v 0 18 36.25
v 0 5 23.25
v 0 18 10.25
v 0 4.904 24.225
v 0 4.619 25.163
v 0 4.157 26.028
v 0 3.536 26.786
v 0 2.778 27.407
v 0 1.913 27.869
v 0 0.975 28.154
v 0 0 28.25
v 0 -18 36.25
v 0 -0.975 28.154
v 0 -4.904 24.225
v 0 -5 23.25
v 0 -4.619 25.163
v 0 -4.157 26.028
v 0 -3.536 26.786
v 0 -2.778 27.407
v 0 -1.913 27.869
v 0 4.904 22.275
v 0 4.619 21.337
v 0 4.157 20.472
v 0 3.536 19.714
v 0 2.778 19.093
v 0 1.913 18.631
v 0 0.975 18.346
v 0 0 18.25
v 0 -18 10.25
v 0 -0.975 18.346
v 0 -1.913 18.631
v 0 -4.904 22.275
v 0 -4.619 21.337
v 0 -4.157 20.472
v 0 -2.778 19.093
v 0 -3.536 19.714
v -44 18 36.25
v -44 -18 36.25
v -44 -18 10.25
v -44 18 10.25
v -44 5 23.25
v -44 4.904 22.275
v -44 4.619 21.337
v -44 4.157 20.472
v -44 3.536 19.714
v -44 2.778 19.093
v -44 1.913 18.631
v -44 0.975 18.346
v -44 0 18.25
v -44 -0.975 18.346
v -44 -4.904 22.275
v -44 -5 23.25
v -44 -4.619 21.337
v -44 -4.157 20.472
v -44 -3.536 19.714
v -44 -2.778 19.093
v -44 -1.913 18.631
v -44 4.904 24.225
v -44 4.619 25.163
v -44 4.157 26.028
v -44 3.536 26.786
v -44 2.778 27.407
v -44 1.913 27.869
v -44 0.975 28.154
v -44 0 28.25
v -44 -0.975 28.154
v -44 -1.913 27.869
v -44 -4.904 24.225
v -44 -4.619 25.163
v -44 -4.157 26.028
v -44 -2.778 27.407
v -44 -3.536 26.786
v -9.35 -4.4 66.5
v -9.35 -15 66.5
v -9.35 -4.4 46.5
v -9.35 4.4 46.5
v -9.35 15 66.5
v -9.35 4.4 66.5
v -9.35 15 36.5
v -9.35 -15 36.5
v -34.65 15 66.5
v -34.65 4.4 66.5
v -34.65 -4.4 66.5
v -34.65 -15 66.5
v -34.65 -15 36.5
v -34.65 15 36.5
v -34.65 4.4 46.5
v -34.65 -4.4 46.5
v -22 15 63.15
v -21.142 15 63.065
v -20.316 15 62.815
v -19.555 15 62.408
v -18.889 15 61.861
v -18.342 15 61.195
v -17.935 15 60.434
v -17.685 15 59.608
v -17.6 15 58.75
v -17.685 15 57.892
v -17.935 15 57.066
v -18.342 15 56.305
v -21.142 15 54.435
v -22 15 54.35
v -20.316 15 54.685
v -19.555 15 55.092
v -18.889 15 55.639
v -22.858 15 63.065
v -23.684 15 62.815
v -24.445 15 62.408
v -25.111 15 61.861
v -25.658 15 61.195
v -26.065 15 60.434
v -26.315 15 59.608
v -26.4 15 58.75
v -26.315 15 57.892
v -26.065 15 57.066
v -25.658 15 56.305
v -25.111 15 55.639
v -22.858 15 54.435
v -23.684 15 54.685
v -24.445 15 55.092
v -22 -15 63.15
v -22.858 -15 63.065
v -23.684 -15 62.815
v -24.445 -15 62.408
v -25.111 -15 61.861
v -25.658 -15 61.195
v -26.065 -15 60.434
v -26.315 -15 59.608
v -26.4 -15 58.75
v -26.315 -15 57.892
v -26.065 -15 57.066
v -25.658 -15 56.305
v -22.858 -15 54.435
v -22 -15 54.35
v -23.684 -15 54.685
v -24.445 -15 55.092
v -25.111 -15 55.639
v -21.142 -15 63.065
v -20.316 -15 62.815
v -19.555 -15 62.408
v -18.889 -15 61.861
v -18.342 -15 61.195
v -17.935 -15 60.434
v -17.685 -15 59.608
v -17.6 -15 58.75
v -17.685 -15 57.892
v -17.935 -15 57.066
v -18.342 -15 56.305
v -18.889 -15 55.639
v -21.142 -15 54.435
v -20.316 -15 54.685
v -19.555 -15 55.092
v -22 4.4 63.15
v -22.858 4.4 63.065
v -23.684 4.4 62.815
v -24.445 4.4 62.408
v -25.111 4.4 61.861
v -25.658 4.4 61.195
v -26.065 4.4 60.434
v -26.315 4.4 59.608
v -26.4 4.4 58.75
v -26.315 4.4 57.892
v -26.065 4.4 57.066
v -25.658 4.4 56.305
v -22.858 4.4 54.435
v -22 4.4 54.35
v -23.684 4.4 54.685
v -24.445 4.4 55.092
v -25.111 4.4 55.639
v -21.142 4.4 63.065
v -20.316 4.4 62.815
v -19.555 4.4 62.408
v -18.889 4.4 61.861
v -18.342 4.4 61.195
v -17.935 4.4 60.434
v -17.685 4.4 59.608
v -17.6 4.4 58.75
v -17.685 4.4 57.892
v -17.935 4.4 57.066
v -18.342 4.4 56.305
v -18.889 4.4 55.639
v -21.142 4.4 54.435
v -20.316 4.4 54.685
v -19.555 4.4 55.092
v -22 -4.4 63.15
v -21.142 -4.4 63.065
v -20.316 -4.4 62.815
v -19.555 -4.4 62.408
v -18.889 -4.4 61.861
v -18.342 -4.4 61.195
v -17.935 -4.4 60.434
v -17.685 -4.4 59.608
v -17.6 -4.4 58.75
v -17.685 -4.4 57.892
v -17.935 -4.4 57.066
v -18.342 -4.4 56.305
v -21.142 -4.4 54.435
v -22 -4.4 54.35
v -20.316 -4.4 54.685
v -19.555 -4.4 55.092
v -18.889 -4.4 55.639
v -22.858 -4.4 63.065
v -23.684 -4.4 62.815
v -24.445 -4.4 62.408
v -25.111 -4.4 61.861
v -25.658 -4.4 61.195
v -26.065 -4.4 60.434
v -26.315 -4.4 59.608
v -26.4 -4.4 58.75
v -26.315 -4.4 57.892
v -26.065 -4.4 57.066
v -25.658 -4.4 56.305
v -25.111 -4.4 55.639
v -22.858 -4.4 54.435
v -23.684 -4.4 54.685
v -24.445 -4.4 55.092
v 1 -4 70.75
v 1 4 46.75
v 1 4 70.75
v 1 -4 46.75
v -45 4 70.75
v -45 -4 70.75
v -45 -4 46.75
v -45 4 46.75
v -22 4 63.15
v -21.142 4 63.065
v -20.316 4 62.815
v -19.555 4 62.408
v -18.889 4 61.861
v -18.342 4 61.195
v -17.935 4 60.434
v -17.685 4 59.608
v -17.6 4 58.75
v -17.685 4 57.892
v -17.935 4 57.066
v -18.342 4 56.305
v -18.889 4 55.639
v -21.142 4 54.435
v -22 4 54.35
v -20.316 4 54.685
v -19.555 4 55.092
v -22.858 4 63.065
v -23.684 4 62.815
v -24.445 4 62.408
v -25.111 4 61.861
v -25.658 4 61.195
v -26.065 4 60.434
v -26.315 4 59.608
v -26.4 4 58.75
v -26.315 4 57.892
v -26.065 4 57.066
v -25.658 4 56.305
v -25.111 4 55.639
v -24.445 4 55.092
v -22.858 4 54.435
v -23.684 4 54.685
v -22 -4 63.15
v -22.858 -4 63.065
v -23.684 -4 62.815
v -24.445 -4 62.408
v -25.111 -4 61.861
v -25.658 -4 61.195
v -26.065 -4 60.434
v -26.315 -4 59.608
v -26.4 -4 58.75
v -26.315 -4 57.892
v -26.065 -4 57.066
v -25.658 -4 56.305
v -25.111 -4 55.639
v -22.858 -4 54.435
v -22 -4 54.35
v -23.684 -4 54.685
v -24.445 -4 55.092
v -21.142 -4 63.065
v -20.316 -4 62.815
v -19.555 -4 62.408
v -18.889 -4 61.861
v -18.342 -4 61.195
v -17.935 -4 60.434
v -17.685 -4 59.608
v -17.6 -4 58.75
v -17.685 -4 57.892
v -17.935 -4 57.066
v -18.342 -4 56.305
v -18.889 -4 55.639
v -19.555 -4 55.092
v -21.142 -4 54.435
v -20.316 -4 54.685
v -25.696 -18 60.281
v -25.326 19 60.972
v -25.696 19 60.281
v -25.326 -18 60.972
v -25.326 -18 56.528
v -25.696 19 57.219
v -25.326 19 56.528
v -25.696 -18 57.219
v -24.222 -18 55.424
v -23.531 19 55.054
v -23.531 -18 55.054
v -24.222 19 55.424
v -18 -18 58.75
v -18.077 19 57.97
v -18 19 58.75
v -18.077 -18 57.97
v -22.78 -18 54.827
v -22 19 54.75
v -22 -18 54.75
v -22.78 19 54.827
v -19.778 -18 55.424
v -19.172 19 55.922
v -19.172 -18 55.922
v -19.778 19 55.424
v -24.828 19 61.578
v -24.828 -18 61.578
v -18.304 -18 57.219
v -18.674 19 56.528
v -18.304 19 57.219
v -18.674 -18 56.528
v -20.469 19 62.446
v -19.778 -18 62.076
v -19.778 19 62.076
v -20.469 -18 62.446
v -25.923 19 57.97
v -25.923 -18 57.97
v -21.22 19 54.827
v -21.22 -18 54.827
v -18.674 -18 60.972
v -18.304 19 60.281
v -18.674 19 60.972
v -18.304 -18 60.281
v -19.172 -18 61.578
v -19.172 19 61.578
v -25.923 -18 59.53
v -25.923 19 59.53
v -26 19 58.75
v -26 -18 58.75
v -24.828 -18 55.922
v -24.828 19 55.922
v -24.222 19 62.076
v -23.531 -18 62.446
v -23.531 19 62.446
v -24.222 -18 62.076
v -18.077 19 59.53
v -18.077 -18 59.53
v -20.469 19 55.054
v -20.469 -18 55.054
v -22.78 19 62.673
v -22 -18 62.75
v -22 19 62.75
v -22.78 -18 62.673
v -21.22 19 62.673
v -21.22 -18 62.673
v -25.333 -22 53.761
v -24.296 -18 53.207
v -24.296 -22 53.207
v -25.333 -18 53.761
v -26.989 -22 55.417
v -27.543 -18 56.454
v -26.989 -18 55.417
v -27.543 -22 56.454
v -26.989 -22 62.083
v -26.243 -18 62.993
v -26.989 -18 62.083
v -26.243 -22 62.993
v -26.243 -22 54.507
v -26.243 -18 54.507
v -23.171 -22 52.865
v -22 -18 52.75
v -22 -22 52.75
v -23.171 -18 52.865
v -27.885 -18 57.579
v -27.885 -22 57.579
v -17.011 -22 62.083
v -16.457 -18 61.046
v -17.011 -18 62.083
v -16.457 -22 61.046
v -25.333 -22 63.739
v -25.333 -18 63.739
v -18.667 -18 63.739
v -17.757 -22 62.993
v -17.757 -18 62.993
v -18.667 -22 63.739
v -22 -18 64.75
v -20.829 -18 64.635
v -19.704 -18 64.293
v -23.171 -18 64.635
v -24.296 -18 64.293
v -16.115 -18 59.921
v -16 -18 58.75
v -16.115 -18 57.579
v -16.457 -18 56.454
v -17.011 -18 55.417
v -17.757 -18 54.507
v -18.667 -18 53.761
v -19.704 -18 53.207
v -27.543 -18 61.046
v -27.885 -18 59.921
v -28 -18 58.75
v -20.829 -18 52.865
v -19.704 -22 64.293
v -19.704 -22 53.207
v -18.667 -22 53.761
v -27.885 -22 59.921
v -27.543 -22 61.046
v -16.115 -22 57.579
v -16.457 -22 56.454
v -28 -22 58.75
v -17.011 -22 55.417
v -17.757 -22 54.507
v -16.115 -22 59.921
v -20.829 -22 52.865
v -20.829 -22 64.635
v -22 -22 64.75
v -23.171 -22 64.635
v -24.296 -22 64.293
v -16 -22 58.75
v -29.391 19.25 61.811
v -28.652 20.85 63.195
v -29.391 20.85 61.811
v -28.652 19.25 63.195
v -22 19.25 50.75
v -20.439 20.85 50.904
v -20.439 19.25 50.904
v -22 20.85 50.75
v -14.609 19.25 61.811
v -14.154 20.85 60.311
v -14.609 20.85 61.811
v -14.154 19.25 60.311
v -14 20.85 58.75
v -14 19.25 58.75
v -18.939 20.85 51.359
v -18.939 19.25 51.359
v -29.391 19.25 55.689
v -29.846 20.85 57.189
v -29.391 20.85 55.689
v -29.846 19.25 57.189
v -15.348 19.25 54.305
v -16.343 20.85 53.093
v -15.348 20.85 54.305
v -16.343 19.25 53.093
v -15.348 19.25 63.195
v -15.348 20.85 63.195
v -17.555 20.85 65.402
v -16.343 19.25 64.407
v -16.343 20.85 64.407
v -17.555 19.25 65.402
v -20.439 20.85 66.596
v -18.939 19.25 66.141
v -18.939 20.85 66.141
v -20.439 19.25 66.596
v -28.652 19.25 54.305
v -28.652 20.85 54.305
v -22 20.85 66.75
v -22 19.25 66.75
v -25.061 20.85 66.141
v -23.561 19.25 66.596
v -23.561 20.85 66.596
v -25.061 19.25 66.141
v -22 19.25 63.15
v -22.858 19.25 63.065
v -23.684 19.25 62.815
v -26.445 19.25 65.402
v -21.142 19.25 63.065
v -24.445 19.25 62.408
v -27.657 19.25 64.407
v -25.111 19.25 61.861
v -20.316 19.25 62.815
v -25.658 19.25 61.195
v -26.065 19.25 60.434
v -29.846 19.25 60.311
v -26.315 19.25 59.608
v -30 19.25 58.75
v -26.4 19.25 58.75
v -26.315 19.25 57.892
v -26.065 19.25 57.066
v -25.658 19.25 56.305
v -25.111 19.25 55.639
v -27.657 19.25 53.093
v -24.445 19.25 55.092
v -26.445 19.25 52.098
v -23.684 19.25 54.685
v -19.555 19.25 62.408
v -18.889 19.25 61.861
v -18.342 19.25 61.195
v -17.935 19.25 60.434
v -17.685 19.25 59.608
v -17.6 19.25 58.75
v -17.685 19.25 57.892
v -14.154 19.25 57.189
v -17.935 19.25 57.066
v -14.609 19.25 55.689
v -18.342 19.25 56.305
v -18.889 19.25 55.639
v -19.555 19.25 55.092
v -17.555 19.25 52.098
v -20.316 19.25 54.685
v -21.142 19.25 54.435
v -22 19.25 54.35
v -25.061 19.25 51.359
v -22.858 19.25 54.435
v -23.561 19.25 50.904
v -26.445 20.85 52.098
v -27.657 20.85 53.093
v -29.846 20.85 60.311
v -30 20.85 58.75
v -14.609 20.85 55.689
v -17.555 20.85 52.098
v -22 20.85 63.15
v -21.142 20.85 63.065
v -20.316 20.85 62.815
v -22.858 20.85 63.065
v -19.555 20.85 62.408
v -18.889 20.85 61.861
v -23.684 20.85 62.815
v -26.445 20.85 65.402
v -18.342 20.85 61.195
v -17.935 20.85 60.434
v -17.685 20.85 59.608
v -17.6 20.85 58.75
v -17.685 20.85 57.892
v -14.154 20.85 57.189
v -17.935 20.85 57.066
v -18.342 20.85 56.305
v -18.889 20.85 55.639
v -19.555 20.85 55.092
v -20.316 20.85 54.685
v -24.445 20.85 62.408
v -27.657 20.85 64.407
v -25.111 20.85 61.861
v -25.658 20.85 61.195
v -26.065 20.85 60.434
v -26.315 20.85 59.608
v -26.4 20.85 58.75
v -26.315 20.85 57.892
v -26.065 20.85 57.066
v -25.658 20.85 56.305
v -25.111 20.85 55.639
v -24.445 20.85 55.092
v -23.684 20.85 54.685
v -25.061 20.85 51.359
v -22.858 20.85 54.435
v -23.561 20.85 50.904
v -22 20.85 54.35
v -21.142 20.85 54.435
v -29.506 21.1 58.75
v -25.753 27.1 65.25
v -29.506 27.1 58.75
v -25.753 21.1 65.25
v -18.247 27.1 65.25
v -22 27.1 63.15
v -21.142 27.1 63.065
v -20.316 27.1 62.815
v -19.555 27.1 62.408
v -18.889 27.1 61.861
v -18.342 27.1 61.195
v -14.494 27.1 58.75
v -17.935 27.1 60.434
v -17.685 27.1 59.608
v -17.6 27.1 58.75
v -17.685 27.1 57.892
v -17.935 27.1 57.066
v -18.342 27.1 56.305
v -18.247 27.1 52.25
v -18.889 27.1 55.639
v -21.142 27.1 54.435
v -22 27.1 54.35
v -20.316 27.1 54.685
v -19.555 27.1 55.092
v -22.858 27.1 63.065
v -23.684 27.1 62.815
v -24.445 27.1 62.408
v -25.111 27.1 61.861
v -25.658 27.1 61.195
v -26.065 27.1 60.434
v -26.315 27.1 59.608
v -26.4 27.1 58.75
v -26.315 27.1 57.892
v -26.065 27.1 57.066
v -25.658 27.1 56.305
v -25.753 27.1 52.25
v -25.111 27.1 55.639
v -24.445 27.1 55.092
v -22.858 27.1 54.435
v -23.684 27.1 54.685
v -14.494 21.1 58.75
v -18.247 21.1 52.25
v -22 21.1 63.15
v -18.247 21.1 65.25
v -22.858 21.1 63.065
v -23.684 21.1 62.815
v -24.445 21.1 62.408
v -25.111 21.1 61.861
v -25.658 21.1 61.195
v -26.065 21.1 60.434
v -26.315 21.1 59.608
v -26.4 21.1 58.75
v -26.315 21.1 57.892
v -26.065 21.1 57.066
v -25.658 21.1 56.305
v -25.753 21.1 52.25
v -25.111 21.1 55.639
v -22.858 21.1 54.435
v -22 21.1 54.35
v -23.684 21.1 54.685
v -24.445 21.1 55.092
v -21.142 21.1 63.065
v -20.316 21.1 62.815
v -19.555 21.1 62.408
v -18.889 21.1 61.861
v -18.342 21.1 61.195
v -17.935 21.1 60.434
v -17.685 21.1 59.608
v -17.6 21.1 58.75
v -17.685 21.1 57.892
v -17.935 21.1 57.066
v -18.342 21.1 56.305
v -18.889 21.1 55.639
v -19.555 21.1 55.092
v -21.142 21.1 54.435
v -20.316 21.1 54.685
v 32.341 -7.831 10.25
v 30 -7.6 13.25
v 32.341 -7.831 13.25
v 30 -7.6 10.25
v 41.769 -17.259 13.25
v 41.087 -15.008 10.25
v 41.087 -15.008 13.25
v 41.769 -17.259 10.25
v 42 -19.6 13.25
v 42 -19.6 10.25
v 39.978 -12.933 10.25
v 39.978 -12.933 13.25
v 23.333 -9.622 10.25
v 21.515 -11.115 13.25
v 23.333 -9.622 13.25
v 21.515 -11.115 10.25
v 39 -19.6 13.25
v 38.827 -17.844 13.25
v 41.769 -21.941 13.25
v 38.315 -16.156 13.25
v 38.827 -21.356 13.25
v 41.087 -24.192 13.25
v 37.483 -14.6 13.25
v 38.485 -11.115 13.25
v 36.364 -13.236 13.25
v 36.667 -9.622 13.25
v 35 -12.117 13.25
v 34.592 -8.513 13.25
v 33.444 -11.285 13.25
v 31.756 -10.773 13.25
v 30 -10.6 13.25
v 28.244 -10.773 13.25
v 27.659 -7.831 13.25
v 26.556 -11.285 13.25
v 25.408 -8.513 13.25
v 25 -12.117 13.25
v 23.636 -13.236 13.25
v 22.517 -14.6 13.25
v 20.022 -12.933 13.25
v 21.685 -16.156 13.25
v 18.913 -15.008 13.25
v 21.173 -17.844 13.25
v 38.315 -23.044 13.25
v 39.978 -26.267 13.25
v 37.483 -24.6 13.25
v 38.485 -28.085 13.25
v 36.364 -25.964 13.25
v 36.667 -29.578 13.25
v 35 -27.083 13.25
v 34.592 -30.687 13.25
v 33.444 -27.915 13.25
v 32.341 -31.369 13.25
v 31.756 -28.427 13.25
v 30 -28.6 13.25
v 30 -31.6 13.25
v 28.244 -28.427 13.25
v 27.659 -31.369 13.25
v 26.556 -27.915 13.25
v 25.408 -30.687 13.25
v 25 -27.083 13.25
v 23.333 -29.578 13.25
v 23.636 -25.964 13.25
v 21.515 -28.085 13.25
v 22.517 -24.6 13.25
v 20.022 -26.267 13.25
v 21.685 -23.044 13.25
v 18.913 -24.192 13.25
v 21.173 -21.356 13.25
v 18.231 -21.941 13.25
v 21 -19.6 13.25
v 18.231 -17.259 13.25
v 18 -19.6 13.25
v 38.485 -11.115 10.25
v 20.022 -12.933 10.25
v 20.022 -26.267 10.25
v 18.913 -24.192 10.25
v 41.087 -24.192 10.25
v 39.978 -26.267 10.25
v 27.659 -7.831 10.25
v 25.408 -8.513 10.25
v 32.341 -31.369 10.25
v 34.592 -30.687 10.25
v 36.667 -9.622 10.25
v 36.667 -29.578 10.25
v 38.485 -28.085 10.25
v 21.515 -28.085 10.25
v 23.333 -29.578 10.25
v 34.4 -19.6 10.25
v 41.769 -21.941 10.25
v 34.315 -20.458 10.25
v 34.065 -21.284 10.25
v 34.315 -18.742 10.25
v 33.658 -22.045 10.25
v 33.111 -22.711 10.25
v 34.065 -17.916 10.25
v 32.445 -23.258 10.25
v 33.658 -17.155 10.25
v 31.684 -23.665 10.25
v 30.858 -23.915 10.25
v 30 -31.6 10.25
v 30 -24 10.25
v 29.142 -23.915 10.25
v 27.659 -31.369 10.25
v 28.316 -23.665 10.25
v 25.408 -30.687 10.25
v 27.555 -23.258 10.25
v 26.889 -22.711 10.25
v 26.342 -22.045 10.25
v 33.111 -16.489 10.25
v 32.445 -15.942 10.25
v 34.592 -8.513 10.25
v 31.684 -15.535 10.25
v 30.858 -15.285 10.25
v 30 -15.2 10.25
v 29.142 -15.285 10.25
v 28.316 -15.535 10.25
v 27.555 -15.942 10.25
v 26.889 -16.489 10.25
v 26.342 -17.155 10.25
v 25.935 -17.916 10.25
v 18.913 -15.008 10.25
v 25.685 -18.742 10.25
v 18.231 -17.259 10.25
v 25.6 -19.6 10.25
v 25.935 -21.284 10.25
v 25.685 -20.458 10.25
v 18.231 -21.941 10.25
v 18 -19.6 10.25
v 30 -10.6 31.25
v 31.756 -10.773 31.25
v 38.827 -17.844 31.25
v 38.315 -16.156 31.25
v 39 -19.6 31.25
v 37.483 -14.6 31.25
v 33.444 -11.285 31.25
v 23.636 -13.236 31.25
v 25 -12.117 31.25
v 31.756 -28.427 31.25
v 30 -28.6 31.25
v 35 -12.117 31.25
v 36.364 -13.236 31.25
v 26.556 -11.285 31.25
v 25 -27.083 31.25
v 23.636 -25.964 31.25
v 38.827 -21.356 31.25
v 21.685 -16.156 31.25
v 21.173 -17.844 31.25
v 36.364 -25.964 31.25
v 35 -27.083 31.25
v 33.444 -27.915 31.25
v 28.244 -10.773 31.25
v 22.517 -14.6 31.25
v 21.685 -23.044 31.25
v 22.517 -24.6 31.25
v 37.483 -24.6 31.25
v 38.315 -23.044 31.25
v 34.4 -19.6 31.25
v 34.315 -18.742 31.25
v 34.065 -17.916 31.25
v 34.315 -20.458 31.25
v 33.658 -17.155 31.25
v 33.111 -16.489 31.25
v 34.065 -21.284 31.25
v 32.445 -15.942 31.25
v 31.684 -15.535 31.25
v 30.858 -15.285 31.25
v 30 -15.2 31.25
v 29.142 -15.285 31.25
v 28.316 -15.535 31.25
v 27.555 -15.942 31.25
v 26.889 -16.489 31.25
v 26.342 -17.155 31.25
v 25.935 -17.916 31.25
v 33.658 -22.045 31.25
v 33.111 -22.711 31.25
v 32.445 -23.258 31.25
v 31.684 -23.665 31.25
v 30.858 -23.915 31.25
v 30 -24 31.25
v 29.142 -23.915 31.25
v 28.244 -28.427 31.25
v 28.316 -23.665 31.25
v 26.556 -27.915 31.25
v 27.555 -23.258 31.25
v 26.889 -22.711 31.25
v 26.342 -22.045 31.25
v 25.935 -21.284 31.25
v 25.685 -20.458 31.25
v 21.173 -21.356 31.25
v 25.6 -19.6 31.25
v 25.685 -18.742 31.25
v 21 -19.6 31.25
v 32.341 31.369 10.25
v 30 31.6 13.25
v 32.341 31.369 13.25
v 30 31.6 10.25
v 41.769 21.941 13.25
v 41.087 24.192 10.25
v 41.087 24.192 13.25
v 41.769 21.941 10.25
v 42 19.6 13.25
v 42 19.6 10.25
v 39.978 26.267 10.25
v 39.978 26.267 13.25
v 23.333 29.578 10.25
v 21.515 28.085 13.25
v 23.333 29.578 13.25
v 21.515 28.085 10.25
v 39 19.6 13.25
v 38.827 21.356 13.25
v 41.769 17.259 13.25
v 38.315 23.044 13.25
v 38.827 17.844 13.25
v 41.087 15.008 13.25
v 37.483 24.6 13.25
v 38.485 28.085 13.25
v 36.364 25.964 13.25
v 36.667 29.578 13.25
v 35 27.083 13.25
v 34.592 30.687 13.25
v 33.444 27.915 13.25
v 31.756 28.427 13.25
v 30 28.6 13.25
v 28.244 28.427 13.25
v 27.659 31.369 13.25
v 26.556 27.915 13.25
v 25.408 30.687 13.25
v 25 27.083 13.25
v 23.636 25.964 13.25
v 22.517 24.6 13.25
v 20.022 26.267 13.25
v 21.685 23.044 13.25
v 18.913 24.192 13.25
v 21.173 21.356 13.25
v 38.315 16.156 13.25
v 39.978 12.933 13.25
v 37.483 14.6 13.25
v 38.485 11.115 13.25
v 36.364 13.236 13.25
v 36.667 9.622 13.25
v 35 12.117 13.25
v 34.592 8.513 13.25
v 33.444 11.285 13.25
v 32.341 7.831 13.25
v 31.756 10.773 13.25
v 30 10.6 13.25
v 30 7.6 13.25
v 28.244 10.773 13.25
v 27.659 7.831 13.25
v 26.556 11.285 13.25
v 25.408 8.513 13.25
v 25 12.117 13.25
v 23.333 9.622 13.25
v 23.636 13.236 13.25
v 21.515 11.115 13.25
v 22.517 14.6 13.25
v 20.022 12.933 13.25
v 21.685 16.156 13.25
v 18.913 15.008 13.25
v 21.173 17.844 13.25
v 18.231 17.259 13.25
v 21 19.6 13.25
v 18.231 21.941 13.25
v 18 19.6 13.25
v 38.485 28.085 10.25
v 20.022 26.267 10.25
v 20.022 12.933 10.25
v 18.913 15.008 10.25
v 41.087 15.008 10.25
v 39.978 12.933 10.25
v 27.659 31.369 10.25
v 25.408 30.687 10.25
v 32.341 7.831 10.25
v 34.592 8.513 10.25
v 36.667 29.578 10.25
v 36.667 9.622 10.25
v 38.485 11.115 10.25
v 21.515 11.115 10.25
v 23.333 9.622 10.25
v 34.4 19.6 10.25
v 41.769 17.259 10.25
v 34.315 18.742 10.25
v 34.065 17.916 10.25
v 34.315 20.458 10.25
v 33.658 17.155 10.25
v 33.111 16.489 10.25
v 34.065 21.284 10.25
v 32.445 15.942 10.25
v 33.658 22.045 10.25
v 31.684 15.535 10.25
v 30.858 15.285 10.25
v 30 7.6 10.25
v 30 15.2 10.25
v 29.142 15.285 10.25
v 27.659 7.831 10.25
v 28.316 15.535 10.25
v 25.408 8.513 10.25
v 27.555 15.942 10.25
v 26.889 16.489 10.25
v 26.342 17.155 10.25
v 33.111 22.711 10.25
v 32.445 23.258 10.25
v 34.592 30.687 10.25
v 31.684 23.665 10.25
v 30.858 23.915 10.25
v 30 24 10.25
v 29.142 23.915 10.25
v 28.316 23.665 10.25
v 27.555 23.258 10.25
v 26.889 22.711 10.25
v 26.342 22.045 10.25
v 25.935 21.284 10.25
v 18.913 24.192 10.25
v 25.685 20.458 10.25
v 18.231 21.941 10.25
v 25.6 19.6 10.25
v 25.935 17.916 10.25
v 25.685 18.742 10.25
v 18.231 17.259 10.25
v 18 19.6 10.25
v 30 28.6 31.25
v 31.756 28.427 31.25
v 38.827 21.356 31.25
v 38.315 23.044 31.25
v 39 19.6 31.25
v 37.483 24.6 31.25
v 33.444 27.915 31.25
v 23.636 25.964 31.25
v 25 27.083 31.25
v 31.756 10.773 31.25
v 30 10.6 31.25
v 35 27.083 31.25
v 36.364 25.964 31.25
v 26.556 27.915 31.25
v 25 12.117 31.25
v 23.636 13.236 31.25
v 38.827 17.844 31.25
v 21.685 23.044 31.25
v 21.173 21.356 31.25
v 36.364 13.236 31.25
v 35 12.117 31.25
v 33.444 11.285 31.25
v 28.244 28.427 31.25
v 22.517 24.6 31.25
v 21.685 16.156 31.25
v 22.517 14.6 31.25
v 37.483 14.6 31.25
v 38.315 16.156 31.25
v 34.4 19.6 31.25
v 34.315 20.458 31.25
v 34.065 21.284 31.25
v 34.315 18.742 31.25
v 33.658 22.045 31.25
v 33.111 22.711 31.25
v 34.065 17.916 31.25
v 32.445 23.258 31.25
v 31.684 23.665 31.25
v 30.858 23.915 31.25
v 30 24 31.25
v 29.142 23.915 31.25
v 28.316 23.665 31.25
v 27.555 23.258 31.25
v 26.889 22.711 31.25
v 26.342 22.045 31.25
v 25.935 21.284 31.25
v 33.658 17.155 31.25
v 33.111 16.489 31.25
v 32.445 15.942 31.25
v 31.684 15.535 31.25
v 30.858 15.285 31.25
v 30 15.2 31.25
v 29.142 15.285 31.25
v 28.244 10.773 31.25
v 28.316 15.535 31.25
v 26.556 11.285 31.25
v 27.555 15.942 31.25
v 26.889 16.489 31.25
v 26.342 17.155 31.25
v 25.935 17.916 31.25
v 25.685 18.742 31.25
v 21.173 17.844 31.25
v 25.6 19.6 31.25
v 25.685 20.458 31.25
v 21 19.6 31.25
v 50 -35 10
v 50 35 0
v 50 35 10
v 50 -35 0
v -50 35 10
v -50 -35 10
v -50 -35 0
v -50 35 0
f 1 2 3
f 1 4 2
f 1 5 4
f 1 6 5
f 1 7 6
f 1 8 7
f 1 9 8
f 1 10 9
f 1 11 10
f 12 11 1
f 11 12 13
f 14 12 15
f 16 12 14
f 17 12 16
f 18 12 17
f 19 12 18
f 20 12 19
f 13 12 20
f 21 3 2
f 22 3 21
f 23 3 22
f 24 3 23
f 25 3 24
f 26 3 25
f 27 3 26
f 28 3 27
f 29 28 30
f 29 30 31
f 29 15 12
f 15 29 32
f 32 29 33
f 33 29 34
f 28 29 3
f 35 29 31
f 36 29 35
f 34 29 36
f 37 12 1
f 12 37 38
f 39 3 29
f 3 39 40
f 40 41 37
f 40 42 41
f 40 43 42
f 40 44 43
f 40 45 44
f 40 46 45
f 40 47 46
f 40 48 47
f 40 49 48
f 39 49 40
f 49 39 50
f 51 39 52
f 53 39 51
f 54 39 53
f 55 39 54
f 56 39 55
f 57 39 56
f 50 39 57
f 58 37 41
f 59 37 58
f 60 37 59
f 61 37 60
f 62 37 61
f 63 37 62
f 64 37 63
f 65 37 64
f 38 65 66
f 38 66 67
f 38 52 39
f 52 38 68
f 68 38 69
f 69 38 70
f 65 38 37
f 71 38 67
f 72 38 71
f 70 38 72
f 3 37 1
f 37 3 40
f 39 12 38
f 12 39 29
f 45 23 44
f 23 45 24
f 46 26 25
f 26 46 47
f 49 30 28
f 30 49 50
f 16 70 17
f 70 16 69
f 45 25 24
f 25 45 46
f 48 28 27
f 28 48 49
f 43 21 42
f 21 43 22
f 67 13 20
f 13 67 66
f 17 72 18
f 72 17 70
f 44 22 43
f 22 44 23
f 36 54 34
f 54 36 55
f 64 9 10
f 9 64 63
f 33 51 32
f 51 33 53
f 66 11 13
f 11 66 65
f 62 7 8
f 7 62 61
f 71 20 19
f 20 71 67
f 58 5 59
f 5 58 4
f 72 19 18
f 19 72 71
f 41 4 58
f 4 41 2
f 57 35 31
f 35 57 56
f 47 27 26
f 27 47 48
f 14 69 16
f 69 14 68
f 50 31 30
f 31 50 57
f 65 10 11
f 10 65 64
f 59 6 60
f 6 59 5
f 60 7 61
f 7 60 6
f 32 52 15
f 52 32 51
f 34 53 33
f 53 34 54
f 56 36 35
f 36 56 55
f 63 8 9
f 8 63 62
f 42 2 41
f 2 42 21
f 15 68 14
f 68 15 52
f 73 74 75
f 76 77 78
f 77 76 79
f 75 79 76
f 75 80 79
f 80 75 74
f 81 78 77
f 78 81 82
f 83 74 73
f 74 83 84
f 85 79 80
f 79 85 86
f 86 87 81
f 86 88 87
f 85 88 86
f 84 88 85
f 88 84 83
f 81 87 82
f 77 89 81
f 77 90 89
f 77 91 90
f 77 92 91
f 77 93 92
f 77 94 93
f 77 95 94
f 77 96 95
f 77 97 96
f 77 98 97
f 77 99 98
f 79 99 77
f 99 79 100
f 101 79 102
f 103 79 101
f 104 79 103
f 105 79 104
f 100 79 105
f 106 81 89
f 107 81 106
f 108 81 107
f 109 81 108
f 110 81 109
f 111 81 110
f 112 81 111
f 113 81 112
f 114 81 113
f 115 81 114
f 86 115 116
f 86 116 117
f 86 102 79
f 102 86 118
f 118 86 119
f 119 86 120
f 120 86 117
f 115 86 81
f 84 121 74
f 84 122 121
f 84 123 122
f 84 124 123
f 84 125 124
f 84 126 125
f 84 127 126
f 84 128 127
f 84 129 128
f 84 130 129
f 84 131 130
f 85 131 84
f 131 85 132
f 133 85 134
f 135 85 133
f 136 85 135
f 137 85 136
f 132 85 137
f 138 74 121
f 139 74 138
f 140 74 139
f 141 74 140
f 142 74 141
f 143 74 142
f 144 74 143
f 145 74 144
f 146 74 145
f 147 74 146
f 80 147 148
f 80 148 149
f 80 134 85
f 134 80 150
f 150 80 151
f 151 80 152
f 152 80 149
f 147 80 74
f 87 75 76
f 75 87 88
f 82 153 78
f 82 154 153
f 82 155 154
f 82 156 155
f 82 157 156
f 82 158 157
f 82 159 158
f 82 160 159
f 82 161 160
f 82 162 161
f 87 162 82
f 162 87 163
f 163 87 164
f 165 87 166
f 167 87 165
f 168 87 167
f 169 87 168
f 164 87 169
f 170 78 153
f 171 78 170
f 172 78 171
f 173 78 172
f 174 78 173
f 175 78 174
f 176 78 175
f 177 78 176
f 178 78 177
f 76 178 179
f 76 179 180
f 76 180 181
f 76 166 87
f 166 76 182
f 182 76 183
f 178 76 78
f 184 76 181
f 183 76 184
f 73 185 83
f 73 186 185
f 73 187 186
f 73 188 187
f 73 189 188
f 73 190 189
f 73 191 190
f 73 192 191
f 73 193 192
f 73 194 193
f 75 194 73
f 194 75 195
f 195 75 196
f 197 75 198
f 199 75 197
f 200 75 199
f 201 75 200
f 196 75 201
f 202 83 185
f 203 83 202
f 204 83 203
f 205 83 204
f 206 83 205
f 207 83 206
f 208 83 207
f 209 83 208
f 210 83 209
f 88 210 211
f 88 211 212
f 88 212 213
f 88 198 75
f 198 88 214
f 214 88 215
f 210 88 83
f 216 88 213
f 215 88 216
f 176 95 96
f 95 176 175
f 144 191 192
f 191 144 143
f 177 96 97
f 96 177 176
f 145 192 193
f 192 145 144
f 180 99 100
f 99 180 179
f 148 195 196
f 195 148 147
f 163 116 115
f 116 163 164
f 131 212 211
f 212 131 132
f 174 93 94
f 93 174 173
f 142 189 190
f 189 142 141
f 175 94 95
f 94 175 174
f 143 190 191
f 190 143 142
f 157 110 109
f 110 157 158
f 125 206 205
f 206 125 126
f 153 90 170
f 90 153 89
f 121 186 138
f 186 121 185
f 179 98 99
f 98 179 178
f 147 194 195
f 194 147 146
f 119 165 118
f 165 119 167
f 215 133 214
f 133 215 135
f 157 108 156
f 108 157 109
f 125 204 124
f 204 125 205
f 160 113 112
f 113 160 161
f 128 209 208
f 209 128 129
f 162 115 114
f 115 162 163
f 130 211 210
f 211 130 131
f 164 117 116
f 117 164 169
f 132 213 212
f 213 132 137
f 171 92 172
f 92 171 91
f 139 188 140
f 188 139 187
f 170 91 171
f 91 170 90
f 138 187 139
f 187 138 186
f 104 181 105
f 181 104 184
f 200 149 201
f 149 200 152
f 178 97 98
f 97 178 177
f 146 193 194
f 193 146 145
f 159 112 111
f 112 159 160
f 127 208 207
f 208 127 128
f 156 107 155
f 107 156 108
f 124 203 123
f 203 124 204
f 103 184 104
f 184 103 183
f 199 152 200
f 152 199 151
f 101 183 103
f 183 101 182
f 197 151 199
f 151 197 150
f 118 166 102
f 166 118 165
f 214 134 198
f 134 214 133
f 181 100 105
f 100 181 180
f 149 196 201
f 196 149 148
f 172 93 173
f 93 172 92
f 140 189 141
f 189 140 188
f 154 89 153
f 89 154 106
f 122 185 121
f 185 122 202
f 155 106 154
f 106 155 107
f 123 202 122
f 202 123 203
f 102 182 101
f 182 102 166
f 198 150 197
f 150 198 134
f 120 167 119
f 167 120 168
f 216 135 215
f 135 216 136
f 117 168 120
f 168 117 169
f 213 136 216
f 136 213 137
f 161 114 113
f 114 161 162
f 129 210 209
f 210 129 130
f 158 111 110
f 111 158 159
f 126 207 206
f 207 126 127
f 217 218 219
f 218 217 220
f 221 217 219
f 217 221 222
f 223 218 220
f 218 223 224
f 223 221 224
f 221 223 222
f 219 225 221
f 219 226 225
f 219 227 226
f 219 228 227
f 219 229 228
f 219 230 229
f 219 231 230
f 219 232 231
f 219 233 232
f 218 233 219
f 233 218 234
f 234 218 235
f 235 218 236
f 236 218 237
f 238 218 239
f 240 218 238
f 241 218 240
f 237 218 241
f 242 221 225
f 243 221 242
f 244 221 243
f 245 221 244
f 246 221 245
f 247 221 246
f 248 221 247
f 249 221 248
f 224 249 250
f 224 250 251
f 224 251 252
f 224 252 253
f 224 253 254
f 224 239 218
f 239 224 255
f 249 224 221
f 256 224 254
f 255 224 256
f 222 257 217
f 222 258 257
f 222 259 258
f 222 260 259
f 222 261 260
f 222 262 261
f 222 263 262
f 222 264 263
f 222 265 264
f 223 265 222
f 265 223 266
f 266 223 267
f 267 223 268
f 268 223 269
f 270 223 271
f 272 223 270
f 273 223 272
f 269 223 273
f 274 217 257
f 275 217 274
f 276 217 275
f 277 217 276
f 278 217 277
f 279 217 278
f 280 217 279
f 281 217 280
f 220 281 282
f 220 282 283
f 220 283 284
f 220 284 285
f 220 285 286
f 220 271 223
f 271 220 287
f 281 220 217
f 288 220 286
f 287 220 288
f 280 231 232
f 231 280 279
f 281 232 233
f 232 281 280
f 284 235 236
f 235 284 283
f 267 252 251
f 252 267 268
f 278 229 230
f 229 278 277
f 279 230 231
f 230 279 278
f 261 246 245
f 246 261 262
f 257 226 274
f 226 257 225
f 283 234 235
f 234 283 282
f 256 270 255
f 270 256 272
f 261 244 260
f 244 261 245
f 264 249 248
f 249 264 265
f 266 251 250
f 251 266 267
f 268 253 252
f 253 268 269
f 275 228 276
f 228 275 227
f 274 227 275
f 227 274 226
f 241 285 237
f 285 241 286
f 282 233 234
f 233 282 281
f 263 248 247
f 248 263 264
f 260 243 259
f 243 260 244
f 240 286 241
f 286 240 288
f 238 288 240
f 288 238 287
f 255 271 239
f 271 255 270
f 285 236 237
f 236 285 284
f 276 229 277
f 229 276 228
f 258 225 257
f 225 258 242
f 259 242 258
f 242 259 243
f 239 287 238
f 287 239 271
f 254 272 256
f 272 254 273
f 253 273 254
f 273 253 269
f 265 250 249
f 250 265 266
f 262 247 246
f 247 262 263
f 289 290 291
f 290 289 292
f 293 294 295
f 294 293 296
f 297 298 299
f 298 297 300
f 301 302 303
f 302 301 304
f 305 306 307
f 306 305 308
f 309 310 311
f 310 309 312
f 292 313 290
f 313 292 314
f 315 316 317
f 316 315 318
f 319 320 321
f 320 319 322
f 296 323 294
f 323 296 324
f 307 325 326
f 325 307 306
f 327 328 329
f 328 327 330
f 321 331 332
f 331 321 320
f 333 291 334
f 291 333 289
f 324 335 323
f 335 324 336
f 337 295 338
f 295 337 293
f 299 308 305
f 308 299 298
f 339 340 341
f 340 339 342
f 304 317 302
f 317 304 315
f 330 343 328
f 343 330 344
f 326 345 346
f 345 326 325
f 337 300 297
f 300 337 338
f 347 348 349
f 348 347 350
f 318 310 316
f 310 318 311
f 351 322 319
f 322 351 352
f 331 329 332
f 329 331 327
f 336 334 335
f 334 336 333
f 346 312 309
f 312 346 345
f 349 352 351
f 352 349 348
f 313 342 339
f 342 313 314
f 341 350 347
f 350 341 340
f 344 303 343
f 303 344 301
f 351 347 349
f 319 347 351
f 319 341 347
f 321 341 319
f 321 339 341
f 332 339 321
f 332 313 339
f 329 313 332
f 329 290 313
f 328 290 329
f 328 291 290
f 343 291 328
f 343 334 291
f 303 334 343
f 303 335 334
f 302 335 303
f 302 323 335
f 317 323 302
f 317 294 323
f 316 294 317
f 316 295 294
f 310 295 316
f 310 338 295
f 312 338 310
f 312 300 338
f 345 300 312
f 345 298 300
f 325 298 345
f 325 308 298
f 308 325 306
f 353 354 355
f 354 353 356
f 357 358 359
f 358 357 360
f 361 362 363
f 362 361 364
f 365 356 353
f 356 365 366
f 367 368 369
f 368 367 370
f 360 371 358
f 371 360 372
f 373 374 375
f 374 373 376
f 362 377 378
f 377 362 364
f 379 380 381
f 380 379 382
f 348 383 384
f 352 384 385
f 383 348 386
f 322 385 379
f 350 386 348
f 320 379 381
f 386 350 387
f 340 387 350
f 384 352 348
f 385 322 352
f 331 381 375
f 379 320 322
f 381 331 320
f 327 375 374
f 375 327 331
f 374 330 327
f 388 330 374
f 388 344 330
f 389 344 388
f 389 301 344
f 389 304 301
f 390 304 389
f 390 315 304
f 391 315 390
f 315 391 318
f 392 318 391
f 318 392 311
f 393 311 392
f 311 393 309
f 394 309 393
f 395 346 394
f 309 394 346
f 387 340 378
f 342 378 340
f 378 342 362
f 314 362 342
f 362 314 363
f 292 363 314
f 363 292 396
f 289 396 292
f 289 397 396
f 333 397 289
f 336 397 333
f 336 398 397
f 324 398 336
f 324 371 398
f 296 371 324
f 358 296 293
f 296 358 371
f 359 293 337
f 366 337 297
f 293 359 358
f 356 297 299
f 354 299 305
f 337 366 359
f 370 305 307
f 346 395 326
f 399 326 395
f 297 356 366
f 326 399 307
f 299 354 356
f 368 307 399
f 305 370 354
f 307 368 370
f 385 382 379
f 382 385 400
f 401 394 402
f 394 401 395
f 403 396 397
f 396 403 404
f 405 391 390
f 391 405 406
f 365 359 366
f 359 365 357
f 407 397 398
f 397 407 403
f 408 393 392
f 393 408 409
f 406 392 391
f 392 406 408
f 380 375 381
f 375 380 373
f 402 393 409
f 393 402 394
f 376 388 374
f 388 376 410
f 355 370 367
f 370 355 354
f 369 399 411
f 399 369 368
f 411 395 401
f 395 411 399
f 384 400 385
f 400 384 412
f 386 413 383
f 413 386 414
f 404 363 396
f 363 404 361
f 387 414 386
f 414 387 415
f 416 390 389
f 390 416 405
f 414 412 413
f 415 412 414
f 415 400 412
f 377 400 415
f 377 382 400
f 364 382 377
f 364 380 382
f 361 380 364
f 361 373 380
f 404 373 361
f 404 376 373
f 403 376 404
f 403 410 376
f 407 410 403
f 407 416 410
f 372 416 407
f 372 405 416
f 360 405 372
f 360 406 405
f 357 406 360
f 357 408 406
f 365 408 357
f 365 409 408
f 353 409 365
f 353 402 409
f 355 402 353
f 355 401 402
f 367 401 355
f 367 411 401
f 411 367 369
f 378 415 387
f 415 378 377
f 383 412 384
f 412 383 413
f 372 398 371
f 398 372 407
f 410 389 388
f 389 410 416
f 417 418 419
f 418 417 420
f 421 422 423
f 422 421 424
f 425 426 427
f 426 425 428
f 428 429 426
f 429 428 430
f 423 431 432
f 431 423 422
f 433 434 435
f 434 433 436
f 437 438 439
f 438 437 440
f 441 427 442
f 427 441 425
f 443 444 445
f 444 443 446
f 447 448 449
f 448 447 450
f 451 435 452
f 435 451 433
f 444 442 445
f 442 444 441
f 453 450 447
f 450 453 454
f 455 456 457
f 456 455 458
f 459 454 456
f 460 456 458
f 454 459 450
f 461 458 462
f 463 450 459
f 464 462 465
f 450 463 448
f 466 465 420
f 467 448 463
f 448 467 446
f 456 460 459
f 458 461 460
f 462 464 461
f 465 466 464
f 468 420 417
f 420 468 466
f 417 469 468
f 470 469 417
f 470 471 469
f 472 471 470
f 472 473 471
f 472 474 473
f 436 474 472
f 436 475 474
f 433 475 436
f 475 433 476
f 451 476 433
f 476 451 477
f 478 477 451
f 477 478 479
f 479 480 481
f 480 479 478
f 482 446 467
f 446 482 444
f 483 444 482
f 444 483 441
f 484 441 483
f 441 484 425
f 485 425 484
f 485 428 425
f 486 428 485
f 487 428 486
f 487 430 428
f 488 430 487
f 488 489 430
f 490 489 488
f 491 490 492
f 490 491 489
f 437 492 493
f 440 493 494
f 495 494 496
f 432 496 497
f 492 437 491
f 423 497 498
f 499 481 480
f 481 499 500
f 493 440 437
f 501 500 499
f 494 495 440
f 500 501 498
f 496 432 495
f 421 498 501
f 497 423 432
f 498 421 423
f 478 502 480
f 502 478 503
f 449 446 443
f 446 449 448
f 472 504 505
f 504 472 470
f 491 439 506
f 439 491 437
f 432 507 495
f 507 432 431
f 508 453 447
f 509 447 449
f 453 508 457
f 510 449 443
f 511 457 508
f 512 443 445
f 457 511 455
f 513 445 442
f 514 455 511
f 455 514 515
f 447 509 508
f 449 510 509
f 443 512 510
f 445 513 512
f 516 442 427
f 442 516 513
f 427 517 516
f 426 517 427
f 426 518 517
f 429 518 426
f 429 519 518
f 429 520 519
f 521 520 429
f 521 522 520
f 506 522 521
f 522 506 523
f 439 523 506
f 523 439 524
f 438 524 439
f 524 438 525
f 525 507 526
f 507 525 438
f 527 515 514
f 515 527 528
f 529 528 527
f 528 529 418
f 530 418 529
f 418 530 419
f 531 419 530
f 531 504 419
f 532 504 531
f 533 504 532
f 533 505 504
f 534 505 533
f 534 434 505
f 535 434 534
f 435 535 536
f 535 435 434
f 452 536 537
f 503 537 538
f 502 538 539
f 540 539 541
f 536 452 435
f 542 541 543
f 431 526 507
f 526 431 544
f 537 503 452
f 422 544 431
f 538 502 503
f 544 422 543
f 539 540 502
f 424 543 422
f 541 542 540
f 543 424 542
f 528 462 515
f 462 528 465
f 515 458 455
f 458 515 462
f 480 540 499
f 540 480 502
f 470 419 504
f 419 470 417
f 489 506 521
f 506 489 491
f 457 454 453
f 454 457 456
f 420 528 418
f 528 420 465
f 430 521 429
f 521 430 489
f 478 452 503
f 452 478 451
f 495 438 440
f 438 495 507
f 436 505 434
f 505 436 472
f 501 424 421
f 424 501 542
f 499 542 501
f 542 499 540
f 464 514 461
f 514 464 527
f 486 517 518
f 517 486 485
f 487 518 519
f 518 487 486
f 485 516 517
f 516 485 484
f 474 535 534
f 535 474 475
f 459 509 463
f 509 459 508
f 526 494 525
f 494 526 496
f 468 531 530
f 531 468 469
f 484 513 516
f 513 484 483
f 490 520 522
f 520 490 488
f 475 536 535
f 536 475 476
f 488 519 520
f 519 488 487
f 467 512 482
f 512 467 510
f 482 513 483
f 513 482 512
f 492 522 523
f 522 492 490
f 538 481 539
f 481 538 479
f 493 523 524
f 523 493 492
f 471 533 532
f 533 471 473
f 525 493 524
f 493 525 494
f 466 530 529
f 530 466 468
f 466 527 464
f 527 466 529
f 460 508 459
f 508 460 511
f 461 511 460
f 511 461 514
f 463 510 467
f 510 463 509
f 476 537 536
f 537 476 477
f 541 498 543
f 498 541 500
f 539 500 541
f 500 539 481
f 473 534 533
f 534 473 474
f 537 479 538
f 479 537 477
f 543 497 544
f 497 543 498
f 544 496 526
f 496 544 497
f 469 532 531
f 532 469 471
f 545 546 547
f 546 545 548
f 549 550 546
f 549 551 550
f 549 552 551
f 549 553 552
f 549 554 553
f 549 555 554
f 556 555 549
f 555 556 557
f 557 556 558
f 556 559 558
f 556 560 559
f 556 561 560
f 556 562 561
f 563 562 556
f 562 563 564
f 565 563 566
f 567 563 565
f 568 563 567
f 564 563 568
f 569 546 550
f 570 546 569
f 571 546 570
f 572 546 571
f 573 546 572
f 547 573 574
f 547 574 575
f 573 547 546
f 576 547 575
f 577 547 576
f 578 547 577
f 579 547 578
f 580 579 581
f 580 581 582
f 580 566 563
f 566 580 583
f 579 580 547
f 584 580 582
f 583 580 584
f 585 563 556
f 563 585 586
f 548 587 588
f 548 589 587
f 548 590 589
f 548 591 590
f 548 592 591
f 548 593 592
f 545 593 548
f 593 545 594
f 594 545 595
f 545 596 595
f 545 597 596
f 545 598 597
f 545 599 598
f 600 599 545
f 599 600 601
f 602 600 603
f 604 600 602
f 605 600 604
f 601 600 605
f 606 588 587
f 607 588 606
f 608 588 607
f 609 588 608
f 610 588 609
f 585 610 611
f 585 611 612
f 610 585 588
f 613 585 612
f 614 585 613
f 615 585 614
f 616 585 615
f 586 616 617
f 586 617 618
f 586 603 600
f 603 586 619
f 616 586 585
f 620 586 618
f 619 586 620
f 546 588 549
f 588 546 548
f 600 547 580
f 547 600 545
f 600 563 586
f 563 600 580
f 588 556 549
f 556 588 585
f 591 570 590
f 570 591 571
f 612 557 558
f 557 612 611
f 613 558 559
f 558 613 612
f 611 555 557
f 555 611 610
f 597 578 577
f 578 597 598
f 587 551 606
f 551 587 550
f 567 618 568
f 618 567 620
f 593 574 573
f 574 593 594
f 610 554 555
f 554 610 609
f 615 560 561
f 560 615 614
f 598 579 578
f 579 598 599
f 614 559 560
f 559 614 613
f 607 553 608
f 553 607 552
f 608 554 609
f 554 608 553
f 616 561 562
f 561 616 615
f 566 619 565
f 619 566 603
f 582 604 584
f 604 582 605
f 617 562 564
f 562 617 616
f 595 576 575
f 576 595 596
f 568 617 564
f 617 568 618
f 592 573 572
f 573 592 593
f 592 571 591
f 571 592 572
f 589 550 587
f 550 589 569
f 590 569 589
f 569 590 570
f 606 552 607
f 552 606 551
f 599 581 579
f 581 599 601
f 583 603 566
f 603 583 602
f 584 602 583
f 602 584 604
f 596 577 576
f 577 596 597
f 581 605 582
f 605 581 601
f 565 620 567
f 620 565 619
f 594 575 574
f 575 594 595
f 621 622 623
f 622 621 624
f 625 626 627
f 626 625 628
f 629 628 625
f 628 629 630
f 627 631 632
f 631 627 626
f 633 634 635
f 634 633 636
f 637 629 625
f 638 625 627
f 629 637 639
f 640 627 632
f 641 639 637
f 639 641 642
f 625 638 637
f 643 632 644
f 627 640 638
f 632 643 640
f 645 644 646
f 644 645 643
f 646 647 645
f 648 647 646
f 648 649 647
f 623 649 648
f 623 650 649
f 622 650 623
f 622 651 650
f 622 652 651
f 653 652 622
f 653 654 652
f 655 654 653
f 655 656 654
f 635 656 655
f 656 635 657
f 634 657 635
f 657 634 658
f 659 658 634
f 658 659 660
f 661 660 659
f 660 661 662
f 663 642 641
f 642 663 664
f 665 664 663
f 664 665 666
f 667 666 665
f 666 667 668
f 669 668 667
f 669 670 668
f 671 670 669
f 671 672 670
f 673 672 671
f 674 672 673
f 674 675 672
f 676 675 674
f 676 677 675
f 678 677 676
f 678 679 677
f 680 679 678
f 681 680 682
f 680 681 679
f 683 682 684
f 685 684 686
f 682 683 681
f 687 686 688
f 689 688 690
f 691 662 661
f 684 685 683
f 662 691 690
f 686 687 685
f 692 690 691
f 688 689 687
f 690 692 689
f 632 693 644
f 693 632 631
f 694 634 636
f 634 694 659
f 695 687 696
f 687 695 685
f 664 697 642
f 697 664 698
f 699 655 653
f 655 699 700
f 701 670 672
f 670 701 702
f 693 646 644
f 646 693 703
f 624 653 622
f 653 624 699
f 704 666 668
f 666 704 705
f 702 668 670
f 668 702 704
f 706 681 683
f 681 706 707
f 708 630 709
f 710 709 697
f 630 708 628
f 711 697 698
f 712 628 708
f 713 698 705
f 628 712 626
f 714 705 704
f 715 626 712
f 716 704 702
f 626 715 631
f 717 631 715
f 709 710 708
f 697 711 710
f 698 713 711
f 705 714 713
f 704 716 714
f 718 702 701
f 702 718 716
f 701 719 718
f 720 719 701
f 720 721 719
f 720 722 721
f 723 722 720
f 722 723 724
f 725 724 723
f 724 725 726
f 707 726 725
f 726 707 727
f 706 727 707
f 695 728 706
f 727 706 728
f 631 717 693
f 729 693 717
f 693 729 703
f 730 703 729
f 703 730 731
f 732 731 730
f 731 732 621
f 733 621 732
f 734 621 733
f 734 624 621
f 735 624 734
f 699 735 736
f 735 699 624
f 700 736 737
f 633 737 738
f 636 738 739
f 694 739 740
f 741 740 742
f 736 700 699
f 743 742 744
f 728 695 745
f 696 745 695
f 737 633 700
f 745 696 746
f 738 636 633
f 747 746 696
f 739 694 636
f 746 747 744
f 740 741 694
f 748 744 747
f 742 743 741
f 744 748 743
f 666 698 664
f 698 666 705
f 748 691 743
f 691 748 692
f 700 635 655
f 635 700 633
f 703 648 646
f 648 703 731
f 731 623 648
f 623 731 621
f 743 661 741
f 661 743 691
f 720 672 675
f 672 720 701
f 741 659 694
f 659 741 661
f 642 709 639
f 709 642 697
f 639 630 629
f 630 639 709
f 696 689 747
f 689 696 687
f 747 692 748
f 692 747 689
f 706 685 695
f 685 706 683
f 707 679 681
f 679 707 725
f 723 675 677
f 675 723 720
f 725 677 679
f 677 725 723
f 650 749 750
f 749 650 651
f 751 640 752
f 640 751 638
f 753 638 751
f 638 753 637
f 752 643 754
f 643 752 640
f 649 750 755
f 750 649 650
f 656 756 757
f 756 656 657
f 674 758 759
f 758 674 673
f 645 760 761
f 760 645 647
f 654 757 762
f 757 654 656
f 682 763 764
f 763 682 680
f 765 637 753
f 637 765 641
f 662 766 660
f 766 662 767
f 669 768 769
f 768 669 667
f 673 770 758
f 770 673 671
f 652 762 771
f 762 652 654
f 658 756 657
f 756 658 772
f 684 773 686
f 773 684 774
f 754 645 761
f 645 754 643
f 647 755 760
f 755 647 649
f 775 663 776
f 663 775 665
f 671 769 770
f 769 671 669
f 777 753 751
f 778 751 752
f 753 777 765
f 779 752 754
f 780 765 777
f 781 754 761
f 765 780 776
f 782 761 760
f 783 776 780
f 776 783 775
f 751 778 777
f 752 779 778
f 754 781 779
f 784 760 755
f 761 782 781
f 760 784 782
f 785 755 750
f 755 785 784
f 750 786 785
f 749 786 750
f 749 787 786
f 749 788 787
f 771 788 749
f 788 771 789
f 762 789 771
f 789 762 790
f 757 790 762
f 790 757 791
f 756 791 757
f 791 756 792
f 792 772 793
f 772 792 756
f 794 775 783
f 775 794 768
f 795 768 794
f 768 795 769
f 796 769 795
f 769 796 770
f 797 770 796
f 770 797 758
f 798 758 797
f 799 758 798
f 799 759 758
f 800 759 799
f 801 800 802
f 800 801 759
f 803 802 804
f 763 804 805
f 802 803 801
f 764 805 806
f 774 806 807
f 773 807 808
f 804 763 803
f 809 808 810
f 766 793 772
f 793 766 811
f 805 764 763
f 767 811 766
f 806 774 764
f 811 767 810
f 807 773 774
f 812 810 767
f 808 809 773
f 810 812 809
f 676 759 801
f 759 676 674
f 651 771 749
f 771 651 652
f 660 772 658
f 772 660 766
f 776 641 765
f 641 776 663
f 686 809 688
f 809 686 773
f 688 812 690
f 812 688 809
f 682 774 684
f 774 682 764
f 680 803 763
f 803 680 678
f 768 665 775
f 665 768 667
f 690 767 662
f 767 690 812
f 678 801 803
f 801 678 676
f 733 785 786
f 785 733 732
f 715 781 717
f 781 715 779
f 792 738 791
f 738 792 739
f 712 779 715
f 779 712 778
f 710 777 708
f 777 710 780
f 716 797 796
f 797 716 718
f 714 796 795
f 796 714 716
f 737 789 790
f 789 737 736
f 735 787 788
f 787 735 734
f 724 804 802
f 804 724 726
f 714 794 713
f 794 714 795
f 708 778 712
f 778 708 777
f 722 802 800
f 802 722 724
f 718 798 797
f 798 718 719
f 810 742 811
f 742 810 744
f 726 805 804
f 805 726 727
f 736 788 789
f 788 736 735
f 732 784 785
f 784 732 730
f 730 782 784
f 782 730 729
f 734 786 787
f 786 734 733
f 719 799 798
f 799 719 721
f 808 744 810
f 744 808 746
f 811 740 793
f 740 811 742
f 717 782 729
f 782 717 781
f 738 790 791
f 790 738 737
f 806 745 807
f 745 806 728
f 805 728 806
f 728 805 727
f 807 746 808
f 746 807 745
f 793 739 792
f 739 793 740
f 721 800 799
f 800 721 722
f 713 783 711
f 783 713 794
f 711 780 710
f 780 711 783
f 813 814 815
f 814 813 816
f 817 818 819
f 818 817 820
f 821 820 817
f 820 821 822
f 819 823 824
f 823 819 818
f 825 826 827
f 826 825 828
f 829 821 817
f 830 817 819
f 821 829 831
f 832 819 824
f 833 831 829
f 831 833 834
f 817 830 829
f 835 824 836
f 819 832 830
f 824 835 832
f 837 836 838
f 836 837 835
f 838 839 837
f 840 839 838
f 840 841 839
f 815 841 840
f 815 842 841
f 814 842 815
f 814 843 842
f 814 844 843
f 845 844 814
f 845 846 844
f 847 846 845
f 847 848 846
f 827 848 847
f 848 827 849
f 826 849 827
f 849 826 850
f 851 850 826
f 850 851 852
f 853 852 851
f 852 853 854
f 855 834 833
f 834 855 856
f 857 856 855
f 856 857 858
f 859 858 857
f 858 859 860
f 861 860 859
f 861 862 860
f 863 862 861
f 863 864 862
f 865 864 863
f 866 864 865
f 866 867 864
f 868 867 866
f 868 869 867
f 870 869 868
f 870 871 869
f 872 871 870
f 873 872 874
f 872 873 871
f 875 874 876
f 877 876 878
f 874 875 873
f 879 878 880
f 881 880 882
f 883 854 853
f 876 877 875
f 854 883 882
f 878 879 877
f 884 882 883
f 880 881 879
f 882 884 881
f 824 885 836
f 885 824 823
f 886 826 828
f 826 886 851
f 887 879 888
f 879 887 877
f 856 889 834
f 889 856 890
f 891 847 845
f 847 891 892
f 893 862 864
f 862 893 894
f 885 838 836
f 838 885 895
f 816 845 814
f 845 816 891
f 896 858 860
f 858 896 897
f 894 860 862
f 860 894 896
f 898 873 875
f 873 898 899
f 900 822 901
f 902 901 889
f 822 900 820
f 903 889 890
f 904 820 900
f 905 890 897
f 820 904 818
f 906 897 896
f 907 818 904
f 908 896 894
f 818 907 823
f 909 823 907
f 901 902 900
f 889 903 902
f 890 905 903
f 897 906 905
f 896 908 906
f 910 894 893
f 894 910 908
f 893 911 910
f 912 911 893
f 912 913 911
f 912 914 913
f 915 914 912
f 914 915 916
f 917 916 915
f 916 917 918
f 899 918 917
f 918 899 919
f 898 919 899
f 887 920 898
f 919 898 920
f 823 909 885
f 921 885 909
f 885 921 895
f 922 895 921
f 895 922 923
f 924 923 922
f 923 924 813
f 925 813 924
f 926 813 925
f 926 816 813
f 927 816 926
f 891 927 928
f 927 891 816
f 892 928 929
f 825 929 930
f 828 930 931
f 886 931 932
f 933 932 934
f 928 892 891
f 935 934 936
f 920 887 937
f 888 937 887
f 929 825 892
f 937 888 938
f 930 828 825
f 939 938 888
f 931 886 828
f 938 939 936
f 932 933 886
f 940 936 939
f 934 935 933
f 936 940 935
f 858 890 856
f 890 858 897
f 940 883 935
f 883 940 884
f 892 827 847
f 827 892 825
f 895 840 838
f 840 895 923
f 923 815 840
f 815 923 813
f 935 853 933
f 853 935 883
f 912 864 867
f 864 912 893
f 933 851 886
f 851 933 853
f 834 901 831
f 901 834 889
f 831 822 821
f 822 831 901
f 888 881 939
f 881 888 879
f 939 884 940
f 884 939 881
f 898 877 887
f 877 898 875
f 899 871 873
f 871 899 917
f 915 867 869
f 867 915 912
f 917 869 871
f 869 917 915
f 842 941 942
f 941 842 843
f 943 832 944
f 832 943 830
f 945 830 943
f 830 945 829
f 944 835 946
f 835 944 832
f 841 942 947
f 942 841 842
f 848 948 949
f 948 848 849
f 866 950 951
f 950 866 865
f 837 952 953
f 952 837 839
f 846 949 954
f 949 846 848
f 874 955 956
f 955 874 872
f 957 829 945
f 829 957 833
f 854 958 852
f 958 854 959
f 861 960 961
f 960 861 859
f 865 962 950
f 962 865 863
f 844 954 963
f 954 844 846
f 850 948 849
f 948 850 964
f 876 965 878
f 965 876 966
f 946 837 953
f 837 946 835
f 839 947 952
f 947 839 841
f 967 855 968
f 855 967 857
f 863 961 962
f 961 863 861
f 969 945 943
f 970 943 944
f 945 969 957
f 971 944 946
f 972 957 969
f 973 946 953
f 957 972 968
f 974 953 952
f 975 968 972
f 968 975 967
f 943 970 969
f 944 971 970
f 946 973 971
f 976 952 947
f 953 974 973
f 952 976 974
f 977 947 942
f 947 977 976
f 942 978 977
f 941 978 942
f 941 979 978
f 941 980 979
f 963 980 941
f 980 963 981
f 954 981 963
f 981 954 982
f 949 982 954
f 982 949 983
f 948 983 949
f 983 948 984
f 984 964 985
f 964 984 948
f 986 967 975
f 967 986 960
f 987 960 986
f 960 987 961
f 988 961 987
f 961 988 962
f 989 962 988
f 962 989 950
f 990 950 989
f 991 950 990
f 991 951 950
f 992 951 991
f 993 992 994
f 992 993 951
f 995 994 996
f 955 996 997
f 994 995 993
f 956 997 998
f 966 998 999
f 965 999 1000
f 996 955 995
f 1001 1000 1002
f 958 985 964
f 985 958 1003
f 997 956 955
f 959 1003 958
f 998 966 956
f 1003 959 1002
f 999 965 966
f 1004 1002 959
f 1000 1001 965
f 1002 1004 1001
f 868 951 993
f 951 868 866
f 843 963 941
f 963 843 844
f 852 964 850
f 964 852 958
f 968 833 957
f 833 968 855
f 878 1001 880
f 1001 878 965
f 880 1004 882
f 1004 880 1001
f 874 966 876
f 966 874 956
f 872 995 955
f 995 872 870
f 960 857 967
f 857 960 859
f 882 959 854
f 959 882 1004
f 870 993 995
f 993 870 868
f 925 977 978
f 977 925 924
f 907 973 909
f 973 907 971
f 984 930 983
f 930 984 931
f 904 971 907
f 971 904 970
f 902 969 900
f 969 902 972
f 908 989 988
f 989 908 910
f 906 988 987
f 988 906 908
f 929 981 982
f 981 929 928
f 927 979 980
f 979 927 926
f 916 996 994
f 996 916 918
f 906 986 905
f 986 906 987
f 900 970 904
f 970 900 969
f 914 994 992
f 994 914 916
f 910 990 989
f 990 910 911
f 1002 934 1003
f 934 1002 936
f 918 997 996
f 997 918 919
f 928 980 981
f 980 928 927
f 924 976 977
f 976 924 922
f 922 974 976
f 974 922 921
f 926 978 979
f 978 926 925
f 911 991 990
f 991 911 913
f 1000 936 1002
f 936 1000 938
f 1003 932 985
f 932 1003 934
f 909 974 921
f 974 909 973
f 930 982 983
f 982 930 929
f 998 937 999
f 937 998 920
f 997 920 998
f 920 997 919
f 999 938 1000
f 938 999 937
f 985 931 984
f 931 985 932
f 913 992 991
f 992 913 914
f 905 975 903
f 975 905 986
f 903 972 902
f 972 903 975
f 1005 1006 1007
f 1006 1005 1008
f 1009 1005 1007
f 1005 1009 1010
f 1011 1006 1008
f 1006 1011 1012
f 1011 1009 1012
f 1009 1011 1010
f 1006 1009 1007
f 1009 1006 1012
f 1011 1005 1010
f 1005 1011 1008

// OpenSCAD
$fn = 32;

// ------------------------------------------------------------------------
// Indexing jig: plate 100 x 70 mm, pin d8
// Every part is its own module, assembly() places every instance.
// ------------------------------------------------------------------------

// --- part 1 ---
module jig_plate() {
  difference() {
    translate([-50, -35, 0]) cube([100, 70, 10]);
  }
}

// --- part 2 ---
module locator_block() {
  difference() {
    translate([-22, -18, 0]) cube([44, 36, 26]);
    translate([0, 0, 13]) rotate([0, 90, 0]) cylinder(h = 46, d = 10, center = true);
  }
}

// --- part 3 ---
module index_fork() {
  difference() {
    translate([-12.65, -15, 0]) cube([25.3, 30, 30]);
    translate([-13.65, -4.4, 10]) cube([27.3, 8.8, 21]);
    translate([0, 0, 22.25]) rotate([90, 0, 0]) cylinder(h = 32, d = 8.8, center = true);
  }
}

// --- part 4 ---
module index_arm() {
  difference() {
    translate([-23, -4, 0]) cube([46, 8, 24]);
    translate([0, 0, 12]) rotate([90, 0, 0]) cylinder(h = 10, d = 8.8, center = true);
  }
}

// --- part 5 ---
module index_pin() {
  rotate([0, 90, 0]) cylinder(h = 38, d = 8, center = true);
  translate([-22, 0, 0]) rotate([0, 90, 0]) cylinder(h = 4, d = 12);
}

// --- part 6 ---
module pin_washer() {
  difference() {
      translate([0, 0, 0]) cylinder(h = 1.6, d = 16);
      translate([0, 0, -1]) cylinder(h = 3.6, d = 8.8);
    }
}

// --- part 7 ---
module lock_nut() {
  difference() {
    linear_extrude(height = 6) polygon(points = [[7.506, 0], [3.753, 6.5], [-3.753, 6.5], [-7.506, 0], [-3.753, -6.5], [3.753, -6.5]]);
    translate([0, 0, -1]) cylinder(h = 8, d = 8.8);
  }
}

// --- part 8 ---
module guide_bush_a() {
  difference() {
    union() {
      cylinder(h = 3, d = 24);
      translate([0, 0, 3]) cylinder(h = 18, d = 18);
    }
    translate([0, 0, -1]) cylinder(h = 23, d = 8.8);
  }
}

// --- part 9 ---
module guide_bush_b() {
  difference() {
    union() {
      cylinder(h = 3, d = 24);
      translate([0, 0, 3]) cylinder(h = 18, d = 18);
    }
    translate([0, 0, -1]) cylinder(h = 23, d = 8.8);
  }
}

// --- assembly ---
module assembly() {
  color([0.80, 0.24, 0.20]) translate([0, 0, 0]) rotate([0, 0, 0]) jig_plate();
  color([0.20, 0.45, 0.75]) translate([-22, 0, 10.25]) rotate([0, 0, 0]) locator_block();
  color([0.25, 0.62, 0.32]) translate([-22, 0, 36.5]) rotate([0, 0, 0]) index_fork();
  color([0.92, 0.70, 0.18]) translate([-22, 0, 46.75]) rotate([0, 0, 0]) index_arm();
  color([0.58, 0.35, 0.70]) translate([-22, 0, 58.75]) rotate([0, 0, 90]) index_pin();
  color([0.16, 0.66, 0.66]) translate([-22, 20.85, 58.75]) rotate([90, 0, 0]) pin_washer();
  color([0.85, 0.48, 0.18]) translate([-22, 27.1, 58.75]) rotate([90, 0, 0]) lock_nut();
  color([0.55, 0.60, 0.65]) translate([30, -19.6, 10.25]) rotate([0, 0, 0]) guide_bush_a();
  color([0.75, 0.30, 0.55]) translate([30, 19.6, 10.25]) rotate([0, 0, 0]) guide_bush_b();
}

assembly();
